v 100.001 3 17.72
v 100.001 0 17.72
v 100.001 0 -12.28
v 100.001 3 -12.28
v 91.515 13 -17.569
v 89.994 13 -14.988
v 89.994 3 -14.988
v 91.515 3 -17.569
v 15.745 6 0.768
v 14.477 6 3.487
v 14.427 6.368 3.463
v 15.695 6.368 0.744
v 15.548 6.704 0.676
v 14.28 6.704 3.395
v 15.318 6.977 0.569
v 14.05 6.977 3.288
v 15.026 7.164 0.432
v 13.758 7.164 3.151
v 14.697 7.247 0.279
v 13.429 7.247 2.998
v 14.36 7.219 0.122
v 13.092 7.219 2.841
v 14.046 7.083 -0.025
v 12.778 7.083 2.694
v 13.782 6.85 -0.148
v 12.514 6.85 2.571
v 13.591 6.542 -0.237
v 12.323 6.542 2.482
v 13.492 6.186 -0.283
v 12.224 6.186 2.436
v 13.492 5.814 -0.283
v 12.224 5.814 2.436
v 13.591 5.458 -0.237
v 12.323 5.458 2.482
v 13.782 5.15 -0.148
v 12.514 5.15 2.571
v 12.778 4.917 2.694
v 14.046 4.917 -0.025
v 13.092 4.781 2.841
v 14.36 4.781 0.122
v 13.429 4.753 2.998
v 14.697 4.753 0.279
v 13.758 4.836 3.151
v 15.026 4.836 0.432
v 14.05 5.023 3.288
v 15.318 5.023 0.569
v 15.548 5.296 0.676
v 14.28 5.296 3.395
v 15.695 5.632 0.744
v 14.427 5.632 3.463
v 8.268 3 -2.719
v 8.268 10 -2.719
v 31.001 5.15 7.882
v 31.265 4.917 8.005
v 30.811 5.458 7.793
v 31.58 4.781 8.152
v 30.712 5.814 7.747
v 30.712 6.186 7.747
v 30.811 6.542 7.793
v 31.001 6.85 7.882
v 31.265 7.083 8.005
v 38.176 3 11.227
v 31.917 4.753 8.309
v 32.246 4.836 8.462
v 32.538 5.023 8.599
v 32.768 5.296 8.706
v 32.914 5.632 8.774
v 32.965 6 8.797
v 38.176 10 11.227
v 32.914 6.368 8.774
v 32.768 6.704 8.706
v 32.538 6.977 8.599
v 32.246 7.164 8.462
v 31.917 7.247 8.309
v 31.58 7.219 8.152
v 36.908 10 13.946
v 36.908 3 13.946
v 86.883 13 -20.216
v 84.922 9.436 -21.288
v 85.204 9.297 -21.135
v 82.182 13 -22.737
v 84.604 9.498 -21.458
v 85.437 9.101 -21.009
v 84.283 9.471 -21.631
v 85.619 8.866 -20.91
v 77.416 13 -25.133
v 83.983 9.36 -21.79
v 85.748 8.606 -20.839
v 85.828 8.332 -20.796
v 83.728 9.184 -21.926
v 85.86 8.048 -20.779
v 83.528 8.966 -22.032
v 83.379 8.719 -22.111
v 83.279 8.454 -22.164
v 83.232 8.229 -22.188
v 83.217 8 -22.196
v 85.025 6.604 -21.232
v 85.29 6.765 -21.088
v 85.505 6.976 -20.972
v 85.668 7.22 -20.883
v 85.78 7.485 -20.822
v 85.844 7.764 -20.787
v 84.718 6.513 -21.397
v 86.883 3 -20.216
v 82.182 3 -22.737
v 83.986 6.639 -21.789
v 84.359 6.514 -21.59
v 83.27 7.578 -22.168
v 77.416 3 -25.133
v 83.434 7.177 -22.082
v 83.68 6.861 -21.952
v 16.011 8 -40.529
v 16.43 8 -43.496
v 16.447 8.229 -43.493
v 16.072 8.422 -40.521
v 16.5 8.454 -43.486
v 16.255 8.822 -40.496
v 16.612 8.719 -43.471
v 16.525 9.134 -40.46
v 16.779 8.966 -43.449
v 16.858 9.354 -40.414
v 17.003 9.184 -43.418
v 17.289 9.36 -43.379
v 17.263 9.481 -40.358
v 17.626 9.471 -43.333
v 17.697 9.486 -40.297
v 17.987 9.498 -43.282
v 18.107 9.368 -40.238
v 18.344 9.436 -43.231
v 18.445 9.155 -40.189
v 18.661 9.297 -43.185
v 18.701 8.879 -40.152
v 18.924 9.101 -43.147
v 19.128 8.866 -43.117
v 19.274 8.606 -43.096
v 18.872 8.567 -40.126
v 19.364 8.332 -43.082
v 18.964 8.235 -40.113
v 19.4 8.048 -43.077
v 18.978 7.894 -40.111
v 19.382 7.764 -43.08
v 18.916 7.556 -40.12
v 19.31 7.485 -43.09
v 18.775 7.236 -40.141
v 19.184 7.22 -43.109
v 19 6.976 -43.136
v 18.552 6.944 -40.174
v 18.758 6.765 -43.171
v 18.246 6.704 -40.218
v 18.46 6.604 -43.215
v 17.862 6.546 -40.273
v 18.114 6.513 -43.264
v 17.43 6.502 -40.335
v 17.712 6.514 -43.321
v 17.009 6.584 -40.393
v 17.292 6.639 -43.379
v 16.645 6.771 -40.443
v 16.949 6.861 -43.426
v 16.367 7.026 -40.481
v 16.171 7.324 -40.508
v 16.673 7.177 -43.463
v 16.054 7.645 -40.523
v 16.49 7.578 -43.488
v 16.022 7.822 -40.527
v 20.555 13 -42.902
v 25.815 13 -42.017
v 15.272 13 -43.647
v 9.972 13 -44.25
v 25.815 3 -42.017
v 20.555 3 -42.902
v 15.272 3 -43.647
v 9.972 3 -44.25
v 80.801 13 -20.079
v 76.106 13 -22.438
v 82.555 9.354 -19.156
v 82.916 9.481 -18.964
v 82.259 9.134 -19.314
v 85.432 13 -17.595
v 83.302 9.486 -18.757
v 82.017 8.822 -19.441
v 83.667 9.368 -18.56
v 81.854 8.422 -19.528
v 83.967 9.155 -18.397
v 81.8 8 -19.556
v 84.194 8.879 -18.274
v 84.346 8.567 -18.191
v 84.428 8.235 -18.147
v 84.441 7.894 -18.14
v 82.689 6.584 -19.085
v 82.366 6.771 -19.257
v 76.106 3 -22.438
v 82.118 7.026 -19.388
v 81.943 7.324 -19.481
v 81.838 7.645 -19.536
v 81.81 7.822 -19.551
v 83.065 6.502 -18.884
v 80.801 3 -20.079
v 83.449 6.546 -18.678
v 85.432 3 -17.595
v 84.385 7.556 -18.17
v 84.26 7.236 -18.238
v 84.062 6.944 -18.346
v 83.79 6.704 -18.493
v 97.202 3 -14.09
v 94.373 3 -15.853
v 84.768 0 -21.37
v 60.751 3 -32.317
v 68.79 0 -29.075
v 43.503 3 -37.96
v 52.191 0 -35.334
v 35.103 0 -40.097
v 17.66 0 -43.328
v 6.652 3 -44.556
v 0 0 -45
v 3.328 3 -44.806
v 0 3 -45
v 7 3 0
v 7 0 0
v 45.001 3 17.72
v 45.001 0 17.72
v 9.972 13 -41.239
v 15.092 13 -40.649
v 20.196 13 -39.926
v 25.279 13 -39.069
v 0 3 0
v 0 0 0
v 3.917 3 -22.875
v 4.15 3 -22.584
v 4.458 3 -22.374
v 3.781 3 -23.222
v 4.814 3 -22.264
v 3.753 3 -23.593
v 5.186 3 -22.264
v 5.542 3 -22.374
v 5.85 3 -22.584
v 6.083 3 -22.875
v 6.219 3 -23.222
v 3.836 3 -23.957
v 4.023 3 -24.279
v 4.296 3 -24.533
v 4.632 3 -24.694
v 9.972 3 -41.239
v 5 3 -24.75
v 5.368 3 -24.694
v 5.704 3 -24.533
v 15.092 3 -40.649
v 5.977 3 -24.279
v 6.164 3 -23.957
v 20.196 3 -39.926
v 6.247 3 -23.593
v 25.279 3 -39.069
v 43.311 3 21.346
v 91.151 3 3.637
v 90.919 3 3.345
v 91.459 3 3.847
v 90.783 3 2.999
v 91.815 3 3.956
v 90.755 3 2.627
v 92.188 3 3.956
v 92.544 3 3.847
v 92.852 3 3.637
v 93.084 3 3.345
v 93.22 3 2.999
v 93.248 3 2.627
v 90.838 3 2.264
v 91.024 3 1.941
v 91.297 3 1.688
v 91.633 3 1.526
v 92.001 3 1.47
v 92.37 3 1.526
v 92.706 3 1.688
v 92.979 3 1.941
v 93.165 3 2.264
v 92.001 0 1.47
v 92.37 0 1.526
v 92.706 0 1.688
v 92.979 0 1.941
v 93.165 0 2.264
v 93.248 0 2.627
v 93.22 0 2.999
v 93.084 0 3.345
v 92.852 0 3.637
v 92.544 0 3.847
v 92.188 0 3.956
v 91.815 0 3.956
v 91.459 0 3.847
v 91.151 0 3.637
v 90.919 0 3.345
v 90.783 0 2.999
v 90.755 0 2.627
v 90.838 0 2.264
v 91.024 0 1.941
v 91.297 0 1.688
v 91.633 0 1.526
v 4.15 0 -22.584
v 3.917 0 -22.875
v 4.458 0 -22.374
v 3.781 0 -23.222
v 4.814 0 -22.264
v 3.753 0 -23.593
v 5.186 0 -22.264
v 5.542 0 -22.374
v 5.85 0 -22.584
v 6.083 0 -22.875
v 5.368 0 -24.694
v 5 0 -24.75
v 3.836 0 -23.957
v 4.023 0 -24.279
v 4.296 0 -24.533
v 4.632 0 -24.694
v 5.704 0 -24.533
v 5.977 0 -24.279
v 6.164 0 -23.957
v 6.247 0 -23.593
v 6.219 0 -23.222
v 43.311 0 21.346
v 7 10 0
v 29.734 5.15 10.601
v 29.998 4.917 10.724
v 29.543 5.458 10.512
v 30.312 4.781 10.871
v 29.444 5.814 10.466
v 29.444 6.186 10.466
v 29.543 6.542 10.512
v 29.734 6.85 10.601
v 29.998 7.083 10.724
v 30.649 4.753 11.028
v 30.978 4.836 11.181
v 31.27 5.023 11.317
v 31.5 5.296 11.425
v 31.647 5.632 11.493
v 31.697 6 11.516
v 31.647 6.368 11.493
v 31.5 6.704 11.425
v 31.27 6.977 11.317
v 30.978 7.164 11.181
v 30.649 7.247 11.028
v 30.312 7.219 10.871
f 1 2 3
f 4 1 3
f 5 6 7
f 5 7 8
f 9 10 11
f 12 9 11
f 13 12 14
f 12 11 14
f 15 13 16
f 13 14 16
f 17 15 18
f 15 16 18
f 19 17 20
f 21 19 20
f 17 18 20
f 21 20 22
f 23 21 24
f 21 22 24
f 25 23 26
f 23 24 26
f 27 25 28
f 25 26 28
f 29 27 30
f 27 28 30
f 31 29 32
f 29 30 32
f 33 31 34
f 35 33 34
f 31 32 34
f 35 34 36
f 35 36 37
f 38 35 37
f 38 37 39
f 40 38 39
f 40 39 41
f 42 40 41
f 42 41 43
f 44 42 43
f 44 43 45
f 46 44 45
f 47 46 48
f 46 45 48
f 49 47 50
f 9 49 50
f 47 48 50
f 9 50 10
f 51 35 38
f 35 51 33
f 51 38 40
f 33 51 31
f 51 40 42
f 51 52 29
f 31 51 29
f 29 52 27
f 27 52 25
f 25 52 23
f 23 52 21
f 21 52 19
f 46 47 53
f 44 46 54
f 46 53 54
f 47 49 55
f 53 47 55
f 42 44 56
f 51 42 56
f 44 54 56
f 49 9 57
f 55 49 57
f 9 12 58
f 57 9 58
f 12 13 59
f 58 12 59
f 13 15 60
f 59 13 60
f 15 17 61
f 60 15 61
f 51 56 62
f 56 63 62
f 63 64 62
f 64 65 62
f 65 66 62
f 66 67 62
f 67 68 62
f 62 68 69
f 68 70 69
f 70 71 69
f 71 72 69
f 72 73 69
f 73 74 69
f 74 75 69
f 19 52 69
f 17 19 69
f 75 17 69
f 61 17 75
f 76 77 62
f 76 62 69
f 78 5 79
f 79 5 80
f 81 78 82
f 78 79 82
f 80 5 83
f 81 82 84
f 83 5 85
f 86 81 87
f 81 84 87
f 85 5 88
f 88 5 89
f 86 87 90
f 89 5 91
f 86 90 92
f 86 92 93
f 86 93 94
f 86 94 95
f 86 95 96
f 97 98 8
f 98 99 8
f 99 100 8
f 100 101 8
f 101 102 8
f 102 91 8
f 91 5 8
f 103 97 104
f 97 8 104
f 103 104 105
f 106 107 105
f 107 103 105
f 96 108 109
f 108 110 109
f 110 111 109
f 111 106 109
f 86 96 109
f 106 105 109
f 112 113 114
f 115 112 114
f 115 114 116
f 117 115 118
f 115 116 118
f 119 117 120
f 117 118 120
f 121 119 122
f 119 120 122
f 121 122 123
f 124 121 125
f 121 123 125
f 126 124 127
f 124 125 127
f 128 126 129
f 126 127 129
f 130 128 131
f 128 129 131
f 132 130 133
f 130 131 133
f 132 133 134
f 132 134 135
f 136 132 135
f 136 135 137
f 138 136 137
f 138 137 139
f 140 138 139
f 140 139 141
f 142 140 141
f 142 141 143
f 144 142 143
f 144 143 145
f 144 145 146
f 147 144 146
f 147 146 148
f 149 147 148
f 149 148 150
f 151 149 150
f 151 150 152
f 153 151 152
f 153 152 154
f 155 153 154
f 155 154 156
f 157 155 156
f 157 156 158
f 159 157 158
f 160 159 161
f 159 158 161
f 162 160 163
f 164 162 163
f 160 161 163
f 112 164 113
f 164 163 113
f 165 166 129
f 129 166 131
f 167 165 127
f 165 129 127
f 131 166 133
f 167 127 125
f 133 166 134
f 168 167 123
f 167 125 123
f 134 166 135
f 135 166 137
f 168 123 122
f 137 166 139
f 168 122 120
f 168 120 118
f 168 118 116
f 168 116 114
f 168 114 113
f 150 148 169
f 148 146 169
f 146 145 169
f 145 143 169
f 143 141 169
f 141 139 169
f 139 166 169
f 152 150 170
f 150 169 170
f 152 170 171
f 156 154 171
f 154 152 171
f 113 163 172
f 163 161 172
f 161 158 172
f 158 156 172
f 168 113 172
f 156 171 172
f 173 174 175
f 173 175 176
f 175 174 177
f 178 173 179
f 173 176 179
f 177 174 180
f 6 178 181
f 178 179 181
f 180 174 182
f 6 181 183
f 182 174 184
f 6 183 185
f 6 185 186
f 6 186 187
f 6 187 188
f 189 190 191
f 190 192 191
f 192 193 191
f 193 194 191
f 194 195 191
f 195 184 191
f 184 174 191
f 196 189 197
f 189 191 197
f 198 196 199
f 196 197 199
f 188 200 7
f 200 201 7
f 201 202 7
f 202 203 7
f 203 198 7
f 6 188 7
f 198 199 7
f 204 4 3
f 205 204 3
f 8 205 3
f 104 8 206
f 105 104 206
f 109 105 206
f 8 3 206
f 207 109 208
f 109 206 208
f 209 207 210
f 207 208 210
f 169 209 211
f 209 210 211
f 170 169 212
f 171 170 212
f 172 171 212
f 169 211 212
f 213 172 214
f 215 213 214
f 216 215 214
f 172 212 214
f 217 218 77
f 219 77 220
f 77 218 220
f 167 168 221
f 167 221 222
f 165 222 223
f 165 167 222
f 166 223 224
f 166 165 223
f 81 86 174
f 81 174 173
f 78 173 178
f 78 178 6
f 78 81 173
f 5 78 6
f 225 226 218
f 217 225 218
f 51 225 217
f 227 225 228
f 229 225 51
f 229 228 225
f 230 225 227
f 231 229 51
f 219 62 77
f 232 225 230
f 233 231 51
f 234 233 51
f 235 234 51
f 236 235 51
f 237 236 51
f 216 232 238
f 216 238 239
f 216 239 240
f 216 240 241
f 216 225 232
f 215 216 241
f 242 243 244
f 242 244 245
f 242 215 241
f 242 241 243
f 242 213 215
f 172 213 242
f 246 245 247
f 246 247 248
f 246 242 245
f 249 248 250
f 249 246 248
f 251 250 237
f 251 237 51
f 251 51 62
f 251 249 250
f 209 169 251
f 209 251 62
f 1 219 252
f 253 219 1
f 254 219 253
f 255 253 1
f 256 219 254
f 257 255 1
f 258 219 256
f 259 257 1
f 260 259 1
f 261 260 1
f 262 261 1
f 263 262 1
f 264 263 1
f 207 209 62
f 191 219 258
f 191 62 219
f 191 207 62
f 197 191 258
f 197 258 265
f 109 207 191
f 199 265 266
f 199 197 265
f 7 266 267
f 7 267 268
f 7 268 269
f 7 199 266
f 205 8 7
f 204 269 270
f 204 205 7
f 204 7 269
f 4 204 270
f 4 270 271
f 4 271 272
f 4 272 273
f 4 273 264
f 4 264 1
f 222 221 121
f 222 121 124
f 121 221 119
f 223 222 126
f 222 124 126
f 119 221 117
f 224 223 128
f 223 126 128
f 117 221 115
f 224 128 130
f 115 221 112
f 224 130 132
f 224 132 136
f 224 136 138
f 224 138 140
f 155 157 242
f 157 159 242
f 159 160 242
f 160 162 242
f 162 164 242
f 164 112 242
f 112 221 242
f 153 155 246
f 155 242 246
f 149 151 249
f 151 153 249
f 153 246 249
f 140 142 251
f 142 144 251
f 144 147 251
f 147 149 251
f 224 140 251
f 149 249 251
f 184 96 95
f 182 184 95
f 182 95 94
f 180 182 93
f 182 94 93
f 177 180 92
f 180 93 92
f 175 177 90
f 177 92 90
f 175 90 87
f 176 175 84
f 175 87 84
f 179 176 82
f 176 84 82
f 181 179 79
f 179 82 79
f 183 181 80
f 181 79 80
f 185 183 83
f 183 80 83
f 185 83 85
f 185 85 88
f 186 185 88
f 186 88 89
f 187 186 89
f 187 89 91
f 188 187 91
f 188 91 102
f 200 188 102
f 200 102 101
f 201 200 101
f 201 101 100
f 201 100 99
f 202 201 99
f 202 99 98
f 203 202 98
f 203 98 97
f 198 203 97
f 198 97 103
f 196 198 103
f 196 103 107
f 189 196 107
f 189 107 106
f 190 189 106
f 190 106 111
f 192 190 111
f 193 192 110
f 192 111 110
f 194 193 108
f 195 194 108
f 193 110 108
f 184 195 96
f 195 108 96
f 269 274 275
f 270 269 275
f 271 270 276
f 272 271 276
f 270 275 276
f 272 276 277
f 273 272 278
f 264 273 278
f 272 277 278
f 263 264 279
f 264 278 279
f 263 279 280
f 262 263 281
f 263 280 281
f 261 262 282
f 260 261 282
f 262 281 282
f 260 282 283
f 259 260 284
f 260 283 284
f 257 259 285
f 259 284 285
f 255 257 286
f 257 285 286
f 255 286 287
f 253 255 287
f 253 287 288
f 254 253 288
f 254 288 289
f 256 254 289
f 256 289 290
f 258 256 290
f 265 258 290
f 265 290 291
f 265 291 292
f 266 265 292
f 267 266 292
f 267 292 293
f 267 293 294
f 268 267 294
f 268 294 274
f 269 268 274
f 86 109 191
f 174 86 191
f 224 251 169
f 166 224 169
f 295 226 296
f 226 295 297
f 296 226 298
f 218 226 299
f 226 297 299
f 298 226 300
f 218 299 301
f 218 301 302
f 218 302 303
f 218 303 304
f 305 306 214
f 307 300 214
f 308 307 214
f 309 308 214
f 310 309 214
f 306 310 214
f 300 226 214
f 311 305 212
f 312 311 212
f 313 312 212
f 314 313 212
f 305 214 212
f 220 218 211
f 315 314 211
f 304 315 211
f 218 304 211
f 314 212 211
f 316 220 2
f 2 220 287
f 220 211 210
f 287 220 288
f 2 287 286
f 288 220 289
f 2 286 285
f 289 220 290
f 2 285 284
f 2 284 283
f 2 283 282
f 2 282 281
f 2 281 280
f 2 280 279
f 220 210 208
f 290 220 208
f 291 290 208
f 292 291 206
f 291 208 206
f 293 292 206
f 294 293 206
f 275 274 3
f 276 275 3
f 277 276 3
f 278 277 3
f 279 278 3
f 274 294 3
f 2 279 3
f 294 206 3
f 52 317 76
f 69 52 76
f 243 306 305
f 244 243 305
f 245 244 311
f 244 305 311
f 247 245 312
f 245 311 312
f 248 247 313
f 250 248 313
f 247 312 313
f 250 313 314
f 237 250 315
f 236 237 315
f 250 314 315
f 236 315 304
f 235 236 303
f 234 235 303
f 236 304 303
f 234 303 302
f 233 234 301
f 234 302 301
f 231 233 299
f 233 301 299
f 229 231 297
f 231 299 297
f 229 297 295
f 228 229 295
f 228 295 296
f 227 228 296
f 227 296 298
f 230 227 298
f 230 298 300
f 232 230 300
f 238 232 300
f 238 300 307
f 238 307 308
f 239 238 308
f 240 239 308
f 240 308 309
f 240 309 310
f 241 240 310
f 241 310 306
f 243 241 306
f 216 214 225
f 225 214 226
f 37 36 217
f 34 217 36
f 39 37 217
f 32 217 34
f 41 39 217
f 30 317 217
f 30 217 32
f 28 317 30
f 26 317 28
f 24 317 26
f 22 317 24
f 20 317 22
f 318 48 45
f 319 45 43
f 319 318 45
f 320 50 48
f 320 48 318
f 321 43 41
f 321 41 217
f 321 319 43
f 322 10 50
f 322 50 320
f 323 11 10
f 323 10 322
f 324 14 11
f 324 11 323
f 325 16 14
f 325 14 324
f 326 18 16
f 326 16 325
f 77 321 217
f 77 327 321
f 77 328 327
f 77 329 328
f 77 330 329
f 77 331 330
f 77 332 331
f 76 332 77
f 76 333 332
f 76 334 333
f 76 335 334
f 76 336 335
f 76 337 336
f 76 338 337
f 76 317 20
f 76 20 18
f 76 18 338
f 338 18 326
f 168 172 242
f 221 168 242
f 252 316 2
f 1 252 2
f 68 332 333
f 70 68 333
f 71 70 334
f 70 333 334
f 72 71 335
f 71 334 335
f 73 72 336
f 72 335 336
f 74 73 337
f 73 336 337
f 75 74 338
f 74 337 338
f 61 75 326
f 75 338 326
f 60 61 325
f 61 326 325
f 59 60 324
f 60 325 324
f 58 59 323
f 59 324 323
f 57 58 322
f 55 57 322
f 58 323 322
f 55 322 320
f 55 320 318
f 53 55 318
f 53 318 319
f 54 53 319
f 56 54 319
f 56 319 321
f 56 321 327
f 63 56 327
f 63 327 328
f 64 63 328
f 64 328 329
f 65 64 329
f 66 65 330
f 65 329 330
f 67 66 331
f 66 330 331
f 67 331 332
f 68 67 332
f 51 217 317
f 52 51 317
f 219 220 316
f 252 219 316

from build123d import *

# Parameters (mm, degrees)
BOSS_EXTRUDE1_DEPTH     = 3
SKETCH2_W               = 33
SKETCH2_H               = 10
SKETCH2_R               = 1.25
BOSS_EXTRUDE2_DEPTH     = 3
SKETCH3_R               = 1.25
CUT_EXTRUDE1_DEPTH      = 111.114926801
BOSS_EXTRUDE3_DEPTH     = 10
CUT_EXTRUDE2_REACH      = 107.286
CUT_EXTRUDE2_END_RADIUS = 197.003812576
SKETCH8_R               = 1.5
CUT_EXTRUDE3_REACH      = 97.662
CUT_EXTRUDE3_END_RADIUS = 197.003812576
SKETCH9_R               = 1.5


with BuildPart() as part:
    # Sketch1 → Boss-Extrude1 (new body)
    with BuildSketch(Plane(origin=(0, 0, 0), x_dir=(1, 0, 0), z_dir=(0, 1, 0))):
        with BuildLine():
            Line((0, 45), (0, 0))
            Line((0, 0), (7, 0))
            Line((7, 0), (45.00148551, -17.720383715))
            Line((45.00148551, -17.720383715), (43.311012463, -21.345614863))
            Line((43.311012463, -21.345614863), (100.00148551, -17.720383715))
            Line((100.00148551, -17.720383715), (100.00148551, 12.279616285))
            ThreePointArc((100.00148551, 12.279616285), (52.191052923, 35.333931061), (0, 45))
        make_face()
    extrude(amount=BOSS_EXTRUDE1_DEPTH)

    # Sketch2 → Boss-Extrude2 (add)
    with BuildSketch(Plane(origin=(1.250243366, 0, -2.681155551), x_dir=(0.9063077870366495, 0, 0.42261826174070033), z_dir=(-0.42261826174070033, 0, 0.9063077870366495))):
        with Locations((22.844154509, 5)):
            Rectangle(SKETCH2_W, SKETCH2_H)
        with Locations((13.344154509, 6)):
            Circle(SKETCH2_R, mode=Mode.SUBTRACT)
        with Locations((32.344154509, 6)):
            Circle(SKETCH2_R, mode=Mode.SUBTRACT)
    extrude(amount=-BOSS_EXTRUDE2_DEPTH)

    # Sketch3 → Cut-Extrude1 (cut, through all)
    with BuildSketch(Plane.XZ):
        with Locations(Location((5, -23.5, 0), (0, 0, 270))):
            Circle(SKETCH3_R)
        with Locations(Location((92.00148551, 2.720383715, 0), (0, 0, 270))):
            Circle(SKETCH3_R)
    extrude(amount=-CUT_EXTRUDE1_DEPTH, mode=Mode.SUBTRACT)

    # Sketch6 → Boss-Extrude3 (add)
    with BuildSketch(Plane(origin=(0, 3, 0), x_dir=(1, 0, 0), z_dir=(0, 1, 0))):
        with BuildLine():
            ThreePointArc((25.815183319, 42.016667614), (17.915864182, 43.291962745), (9.971855225, 44.250264466))
            Line((9.971855225, 44.250264466), (9.971855225, 41.238788581))
            ThreePointArc((9.971855225, 41.238788581), (17.646509134, 40.304062324), (25.278576941, 39.068923955))
            Line((25.278576941, 39.068923955), (25.815183319, 42.016667614))
        make_face()
        with BuildLine():
            ThreePointArc((91.515126037, 17.56938971), (84.541117021, 21.492248202), (77.415775106, 25.13300679))
            Line((77.415775106, 25.13300679), (76.106143507, 22.438196193))
            ThreePointArc((76.106143507, 22.438196193), (83.124741123, 18.85197958), (89.994272948, 14.987889185))
            Line((89.994272948, 14.987889185), (91.515126037, 17.56938971))
        make_face()
    extrude(amount=BOSS_EXTRUDE3_DEPTH)

    # Cut-Extrude2: up to this cylinder (the profile starts outside it)
    cut_extrude2_end = Plane(origin=(-10.004096478, 8, 154.749638432), z_dir=(0, -1, 0)) * Cylinder(CUT_EXTRUDE2_END_RADIUS, 609.579625152, mode=Mode.PRIVATE)
    # Sketch8 → Cut-Extrude2 (cut, up to the surface)
    with BuildSketch(Plane(origin=(17.915864182, 13, -43.291962745), x_dir=(-0.9902080058846244, 0, -0.13959980330213892), z_dir=(0.13959980330213892, 0, -0.9902080058846244)), mode=Mode.PRIVATE) as cut_extrude2_sk1:
        with Locations((0, -5)):
            Circle(SKETCH8_R)
    cut_extrude2_tool1 = extrude(cut_extrude2_sk1.sketch, amount=-CUT_EXTRUDE2_REACH, mode=Mode.PRIVATE) - cut_extrude2_end
    add(cut_extrude2_tool1.solids().sort_by_distance((17.915864, 8, -43.291963))[0], mode=Mode.SUBTRACT)

    # Cut-Extrude3: up to this cylinder (the profile starts outside it)
    cut_extrude3_end = Plane(origin=(-10.004096478, 8, 154.749638432), z_dir=(0, -1, 0)) * Cylinder(CUT_EXTRUDE3_END_RADIUS, 590.331625152, mode=Mode.PRIVATE)
    # Sketch9 → Cut-Extrude3 (cut, up to the surface)
    with BuildSketch(Plane(origin=(84.541117021, 13, -21.492248202), x_dir=(-0.8812094331704029, 0, -0.4727260674973377), z_dir=(0.4727260674973377, 0, -0.8812094331704029)), mode=Mode.PRIVATE) as cut_extrude3_sk1:
        with Locations((0, -5)):
            Circle(SKETCH9_R)
    cut_extrude3_tool1 = extrude(cut_extrude3_sk1.sketch, amount=-CUT_EXTRUDE3_REACH, mode=Mode.PRIVATE) - cut_extrude3_end
    add(cut_extrude3_tool1.solids().sort_by_distance((84.541117, 8, -21.492248))[0], mode=Mode.SUBTRACT)


solid = part.part
